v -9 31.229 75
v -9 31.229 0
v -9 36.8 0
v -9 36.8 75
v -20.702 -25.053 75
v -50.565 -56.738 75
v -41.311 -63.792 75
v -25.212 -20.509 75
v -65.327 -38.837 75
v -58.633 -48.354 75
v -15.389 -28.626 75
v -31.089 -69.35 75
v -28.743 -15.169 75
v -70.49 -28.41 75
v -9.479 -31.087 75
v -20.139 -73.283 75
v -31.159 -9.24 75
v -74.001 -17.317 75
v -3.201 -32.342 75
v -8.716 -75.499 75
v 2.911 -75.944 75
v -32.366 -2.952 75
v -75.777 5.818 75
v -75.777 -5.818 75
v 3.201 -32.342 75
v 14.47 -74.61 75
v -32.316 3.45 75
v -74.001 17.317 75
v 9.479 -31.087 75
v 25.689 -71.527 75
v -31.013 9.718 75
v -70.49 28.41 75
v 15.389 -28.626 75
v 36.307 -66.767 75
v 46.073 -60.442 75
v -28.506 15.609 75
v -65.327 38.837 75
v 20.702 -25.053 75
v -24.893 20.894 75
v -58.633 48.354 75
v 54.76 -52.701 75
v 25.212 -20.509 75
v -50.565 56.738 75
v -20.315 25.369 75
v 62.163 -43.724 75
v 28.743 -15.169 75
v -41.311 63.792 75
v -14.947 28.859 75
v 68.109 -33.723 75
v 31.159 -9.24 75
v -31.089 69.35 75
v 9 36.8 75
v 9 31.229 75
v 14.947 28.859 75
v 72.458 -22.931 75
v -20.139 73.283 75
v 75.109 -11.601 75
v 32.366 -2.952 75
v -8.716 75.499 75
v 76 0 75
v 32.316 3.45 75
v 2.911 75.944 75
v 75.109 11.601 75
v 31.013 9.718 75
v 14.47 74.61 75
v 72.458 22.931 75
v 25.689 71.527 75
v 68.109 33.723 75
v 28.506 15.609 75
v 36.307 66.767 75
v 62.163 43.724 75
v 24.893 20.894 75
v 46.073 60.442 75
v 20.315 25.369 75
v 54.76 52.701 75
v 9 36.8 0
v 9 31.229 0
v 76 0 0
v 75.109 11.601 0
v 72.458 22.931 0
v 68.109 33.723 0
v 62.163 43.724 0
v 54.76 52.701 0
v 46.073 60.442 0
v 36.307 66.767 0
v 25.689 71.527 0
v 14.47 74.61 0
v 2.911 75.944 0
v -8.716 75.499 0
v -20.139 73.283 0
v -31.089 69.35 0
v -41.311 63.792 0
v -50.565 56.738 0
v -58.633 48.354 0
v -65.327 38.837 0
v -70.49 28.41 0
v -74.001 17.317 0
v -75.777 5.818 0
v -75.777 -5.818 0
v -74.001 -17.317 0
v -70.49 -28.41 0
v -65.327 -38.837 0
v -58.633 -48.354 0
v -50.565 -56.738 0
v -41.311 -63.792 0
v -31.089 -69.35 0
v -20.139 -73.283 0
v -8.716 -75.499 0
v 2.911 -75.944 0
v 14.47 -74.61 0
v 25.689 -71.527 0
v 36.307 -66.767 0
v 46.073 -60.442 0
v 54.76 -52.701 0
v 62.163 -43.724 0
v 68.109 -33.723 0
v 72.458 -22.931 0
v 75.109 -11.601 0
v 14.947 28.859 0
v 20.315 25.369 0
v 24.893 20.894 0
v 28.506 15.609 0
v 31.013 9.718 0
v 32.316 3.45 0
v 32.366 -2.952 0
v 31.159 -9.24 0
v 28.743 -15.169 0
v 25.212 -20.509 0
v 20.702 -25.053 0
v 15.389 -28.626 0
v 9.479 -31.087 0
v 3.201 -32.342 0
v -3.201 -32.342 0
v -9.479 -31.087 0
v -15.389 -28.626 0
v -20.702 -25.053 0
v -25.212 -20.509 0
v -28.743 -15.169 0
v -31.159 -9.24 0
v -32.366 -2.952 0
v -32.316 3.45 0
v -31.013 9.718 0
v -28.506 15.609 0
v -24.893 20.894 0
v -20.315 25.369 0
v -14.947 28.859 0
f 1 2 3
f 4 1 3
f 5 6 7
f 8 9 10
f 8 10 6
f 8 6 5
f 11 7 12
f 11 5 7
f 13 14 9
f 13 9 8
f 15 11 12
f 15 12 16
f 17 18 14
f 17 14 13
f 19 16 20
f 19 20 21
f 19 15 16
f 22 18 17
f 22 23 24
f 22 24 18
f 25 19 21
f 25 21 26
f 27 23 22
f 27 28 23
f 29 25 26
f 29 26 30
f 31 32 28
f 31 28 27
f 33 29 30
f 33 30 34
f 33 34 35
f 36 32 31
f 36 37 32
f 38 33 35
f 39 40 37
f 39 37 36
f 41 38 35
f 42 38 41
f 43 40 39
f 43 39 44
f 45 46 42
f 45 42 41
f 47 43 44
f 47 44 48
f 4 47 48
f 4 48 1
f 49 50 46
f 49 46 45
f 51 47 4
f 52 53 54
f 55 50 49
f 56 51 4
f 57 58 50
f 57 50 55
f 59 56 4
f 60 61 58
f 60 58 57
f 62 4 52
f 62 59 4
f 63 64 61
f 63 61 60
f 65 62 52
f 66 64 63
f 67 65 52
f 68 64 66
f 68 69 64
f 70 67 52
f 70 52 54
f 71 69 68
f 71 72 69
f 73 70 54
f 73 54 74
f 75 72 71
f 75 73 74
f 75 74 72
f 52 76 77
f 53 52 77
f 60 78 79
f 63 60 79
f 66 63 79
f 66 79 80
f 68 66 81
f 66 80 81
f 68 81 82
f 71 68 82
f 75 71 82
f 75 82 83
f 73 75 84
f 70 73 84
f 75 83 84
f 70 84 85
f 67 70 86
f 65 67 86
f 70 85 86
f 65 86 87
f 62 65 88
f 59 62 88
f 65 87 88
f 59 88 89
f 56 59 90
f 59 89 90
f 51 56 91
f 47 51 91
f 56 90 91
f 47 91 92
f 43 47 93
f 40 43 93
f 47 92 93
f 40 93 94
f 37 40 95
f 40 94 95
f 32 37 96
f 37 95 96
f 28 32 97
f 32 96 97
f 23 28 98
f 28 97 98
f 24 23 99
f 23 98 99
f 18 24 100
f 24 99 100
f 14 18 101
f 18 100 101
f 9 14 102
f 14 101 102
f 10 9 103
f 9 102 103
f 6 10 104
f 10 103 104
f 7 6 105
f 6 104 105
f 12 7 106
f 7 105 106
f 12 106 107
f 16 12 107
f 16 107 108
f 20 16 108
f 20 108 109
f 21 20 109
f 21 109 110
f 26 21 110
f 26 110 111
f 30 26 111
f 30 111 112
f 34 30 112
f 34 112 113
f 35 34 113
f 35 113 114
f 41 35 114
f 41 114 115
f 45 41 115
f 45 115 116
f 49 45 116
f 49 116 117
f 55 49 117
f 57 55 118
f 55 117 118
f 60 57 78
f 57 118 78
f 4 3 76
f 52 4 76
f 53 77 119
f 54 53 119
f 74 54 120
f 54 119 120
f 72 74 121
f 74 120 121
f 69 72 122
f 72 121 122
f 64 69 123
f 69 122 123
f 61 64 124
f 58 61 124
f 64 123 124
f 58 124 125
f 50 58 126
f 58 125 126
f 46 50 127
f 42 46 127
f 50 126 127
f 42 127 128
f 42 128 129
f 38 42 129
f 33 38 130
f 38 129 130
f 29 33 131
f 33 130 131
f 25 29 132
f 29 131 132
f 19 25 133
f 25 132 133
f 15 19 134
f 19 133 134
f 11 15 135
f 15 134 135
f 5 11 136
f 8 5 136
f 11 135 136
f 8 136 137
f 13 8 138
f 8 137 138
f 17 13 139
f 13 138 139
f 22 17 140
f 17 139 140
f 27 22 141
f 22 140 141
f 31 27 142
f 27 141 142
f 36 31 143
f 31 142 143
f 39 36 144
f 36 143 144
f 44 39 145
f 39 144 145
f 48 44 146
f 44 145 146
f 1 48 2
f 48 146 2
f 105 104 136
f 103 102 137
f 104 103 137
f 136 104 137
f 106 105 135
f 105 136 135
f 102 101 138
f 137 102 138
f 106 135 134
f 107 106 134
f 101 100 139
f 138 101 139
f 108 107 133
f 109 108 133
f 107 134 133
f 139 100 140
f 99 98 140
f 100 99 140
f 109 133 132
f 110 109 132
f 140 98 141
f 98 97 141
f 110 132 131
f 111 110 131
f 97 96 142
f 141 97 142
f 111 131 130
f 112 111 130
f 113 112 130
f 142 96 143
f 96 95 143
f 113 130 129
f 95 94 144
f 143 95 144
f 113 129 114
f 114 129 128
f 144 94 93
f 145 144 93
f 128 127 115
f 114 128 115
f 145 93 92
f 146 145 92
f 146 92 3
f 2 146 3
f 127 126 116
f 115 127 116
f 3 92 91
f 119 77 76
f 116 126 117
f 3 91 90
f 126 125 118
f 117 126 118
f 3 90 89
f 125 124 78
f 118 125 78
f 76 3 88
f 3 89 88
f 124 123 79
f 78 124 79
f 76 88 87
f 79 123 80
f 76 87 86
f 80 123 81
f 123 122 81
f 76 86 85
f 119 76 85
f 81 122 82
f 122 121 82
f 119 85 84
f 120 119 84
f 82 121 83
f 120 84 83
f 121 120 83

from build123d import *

# Parameters (mm, degrees)
SKETCH1_R           = 76
BOSS_EXTRUDE1_DEPTH = 75


with BuildPart() as part:
    # Sketch1 → Boss-Extrude1 (new body)
    with BuildSketch(Plane.XY):
        Circle(SKETCH1_R)
        with BuildLine():
            Line((-9, 31.228992939), (-9, 36.8))
            Line((-9, 36.8), (9, 36.8))
            Line((9, 36.8), (9, 31.228992939))
            ThreePointArc((9, 31.228992939), (0, -32.5), (-9, 31.228992939))
        make_face(mode=Mode.SUBTRACT)
    extrude(amount=BOSS_EXTRUDE1_DEPTH)


solid = part.part
